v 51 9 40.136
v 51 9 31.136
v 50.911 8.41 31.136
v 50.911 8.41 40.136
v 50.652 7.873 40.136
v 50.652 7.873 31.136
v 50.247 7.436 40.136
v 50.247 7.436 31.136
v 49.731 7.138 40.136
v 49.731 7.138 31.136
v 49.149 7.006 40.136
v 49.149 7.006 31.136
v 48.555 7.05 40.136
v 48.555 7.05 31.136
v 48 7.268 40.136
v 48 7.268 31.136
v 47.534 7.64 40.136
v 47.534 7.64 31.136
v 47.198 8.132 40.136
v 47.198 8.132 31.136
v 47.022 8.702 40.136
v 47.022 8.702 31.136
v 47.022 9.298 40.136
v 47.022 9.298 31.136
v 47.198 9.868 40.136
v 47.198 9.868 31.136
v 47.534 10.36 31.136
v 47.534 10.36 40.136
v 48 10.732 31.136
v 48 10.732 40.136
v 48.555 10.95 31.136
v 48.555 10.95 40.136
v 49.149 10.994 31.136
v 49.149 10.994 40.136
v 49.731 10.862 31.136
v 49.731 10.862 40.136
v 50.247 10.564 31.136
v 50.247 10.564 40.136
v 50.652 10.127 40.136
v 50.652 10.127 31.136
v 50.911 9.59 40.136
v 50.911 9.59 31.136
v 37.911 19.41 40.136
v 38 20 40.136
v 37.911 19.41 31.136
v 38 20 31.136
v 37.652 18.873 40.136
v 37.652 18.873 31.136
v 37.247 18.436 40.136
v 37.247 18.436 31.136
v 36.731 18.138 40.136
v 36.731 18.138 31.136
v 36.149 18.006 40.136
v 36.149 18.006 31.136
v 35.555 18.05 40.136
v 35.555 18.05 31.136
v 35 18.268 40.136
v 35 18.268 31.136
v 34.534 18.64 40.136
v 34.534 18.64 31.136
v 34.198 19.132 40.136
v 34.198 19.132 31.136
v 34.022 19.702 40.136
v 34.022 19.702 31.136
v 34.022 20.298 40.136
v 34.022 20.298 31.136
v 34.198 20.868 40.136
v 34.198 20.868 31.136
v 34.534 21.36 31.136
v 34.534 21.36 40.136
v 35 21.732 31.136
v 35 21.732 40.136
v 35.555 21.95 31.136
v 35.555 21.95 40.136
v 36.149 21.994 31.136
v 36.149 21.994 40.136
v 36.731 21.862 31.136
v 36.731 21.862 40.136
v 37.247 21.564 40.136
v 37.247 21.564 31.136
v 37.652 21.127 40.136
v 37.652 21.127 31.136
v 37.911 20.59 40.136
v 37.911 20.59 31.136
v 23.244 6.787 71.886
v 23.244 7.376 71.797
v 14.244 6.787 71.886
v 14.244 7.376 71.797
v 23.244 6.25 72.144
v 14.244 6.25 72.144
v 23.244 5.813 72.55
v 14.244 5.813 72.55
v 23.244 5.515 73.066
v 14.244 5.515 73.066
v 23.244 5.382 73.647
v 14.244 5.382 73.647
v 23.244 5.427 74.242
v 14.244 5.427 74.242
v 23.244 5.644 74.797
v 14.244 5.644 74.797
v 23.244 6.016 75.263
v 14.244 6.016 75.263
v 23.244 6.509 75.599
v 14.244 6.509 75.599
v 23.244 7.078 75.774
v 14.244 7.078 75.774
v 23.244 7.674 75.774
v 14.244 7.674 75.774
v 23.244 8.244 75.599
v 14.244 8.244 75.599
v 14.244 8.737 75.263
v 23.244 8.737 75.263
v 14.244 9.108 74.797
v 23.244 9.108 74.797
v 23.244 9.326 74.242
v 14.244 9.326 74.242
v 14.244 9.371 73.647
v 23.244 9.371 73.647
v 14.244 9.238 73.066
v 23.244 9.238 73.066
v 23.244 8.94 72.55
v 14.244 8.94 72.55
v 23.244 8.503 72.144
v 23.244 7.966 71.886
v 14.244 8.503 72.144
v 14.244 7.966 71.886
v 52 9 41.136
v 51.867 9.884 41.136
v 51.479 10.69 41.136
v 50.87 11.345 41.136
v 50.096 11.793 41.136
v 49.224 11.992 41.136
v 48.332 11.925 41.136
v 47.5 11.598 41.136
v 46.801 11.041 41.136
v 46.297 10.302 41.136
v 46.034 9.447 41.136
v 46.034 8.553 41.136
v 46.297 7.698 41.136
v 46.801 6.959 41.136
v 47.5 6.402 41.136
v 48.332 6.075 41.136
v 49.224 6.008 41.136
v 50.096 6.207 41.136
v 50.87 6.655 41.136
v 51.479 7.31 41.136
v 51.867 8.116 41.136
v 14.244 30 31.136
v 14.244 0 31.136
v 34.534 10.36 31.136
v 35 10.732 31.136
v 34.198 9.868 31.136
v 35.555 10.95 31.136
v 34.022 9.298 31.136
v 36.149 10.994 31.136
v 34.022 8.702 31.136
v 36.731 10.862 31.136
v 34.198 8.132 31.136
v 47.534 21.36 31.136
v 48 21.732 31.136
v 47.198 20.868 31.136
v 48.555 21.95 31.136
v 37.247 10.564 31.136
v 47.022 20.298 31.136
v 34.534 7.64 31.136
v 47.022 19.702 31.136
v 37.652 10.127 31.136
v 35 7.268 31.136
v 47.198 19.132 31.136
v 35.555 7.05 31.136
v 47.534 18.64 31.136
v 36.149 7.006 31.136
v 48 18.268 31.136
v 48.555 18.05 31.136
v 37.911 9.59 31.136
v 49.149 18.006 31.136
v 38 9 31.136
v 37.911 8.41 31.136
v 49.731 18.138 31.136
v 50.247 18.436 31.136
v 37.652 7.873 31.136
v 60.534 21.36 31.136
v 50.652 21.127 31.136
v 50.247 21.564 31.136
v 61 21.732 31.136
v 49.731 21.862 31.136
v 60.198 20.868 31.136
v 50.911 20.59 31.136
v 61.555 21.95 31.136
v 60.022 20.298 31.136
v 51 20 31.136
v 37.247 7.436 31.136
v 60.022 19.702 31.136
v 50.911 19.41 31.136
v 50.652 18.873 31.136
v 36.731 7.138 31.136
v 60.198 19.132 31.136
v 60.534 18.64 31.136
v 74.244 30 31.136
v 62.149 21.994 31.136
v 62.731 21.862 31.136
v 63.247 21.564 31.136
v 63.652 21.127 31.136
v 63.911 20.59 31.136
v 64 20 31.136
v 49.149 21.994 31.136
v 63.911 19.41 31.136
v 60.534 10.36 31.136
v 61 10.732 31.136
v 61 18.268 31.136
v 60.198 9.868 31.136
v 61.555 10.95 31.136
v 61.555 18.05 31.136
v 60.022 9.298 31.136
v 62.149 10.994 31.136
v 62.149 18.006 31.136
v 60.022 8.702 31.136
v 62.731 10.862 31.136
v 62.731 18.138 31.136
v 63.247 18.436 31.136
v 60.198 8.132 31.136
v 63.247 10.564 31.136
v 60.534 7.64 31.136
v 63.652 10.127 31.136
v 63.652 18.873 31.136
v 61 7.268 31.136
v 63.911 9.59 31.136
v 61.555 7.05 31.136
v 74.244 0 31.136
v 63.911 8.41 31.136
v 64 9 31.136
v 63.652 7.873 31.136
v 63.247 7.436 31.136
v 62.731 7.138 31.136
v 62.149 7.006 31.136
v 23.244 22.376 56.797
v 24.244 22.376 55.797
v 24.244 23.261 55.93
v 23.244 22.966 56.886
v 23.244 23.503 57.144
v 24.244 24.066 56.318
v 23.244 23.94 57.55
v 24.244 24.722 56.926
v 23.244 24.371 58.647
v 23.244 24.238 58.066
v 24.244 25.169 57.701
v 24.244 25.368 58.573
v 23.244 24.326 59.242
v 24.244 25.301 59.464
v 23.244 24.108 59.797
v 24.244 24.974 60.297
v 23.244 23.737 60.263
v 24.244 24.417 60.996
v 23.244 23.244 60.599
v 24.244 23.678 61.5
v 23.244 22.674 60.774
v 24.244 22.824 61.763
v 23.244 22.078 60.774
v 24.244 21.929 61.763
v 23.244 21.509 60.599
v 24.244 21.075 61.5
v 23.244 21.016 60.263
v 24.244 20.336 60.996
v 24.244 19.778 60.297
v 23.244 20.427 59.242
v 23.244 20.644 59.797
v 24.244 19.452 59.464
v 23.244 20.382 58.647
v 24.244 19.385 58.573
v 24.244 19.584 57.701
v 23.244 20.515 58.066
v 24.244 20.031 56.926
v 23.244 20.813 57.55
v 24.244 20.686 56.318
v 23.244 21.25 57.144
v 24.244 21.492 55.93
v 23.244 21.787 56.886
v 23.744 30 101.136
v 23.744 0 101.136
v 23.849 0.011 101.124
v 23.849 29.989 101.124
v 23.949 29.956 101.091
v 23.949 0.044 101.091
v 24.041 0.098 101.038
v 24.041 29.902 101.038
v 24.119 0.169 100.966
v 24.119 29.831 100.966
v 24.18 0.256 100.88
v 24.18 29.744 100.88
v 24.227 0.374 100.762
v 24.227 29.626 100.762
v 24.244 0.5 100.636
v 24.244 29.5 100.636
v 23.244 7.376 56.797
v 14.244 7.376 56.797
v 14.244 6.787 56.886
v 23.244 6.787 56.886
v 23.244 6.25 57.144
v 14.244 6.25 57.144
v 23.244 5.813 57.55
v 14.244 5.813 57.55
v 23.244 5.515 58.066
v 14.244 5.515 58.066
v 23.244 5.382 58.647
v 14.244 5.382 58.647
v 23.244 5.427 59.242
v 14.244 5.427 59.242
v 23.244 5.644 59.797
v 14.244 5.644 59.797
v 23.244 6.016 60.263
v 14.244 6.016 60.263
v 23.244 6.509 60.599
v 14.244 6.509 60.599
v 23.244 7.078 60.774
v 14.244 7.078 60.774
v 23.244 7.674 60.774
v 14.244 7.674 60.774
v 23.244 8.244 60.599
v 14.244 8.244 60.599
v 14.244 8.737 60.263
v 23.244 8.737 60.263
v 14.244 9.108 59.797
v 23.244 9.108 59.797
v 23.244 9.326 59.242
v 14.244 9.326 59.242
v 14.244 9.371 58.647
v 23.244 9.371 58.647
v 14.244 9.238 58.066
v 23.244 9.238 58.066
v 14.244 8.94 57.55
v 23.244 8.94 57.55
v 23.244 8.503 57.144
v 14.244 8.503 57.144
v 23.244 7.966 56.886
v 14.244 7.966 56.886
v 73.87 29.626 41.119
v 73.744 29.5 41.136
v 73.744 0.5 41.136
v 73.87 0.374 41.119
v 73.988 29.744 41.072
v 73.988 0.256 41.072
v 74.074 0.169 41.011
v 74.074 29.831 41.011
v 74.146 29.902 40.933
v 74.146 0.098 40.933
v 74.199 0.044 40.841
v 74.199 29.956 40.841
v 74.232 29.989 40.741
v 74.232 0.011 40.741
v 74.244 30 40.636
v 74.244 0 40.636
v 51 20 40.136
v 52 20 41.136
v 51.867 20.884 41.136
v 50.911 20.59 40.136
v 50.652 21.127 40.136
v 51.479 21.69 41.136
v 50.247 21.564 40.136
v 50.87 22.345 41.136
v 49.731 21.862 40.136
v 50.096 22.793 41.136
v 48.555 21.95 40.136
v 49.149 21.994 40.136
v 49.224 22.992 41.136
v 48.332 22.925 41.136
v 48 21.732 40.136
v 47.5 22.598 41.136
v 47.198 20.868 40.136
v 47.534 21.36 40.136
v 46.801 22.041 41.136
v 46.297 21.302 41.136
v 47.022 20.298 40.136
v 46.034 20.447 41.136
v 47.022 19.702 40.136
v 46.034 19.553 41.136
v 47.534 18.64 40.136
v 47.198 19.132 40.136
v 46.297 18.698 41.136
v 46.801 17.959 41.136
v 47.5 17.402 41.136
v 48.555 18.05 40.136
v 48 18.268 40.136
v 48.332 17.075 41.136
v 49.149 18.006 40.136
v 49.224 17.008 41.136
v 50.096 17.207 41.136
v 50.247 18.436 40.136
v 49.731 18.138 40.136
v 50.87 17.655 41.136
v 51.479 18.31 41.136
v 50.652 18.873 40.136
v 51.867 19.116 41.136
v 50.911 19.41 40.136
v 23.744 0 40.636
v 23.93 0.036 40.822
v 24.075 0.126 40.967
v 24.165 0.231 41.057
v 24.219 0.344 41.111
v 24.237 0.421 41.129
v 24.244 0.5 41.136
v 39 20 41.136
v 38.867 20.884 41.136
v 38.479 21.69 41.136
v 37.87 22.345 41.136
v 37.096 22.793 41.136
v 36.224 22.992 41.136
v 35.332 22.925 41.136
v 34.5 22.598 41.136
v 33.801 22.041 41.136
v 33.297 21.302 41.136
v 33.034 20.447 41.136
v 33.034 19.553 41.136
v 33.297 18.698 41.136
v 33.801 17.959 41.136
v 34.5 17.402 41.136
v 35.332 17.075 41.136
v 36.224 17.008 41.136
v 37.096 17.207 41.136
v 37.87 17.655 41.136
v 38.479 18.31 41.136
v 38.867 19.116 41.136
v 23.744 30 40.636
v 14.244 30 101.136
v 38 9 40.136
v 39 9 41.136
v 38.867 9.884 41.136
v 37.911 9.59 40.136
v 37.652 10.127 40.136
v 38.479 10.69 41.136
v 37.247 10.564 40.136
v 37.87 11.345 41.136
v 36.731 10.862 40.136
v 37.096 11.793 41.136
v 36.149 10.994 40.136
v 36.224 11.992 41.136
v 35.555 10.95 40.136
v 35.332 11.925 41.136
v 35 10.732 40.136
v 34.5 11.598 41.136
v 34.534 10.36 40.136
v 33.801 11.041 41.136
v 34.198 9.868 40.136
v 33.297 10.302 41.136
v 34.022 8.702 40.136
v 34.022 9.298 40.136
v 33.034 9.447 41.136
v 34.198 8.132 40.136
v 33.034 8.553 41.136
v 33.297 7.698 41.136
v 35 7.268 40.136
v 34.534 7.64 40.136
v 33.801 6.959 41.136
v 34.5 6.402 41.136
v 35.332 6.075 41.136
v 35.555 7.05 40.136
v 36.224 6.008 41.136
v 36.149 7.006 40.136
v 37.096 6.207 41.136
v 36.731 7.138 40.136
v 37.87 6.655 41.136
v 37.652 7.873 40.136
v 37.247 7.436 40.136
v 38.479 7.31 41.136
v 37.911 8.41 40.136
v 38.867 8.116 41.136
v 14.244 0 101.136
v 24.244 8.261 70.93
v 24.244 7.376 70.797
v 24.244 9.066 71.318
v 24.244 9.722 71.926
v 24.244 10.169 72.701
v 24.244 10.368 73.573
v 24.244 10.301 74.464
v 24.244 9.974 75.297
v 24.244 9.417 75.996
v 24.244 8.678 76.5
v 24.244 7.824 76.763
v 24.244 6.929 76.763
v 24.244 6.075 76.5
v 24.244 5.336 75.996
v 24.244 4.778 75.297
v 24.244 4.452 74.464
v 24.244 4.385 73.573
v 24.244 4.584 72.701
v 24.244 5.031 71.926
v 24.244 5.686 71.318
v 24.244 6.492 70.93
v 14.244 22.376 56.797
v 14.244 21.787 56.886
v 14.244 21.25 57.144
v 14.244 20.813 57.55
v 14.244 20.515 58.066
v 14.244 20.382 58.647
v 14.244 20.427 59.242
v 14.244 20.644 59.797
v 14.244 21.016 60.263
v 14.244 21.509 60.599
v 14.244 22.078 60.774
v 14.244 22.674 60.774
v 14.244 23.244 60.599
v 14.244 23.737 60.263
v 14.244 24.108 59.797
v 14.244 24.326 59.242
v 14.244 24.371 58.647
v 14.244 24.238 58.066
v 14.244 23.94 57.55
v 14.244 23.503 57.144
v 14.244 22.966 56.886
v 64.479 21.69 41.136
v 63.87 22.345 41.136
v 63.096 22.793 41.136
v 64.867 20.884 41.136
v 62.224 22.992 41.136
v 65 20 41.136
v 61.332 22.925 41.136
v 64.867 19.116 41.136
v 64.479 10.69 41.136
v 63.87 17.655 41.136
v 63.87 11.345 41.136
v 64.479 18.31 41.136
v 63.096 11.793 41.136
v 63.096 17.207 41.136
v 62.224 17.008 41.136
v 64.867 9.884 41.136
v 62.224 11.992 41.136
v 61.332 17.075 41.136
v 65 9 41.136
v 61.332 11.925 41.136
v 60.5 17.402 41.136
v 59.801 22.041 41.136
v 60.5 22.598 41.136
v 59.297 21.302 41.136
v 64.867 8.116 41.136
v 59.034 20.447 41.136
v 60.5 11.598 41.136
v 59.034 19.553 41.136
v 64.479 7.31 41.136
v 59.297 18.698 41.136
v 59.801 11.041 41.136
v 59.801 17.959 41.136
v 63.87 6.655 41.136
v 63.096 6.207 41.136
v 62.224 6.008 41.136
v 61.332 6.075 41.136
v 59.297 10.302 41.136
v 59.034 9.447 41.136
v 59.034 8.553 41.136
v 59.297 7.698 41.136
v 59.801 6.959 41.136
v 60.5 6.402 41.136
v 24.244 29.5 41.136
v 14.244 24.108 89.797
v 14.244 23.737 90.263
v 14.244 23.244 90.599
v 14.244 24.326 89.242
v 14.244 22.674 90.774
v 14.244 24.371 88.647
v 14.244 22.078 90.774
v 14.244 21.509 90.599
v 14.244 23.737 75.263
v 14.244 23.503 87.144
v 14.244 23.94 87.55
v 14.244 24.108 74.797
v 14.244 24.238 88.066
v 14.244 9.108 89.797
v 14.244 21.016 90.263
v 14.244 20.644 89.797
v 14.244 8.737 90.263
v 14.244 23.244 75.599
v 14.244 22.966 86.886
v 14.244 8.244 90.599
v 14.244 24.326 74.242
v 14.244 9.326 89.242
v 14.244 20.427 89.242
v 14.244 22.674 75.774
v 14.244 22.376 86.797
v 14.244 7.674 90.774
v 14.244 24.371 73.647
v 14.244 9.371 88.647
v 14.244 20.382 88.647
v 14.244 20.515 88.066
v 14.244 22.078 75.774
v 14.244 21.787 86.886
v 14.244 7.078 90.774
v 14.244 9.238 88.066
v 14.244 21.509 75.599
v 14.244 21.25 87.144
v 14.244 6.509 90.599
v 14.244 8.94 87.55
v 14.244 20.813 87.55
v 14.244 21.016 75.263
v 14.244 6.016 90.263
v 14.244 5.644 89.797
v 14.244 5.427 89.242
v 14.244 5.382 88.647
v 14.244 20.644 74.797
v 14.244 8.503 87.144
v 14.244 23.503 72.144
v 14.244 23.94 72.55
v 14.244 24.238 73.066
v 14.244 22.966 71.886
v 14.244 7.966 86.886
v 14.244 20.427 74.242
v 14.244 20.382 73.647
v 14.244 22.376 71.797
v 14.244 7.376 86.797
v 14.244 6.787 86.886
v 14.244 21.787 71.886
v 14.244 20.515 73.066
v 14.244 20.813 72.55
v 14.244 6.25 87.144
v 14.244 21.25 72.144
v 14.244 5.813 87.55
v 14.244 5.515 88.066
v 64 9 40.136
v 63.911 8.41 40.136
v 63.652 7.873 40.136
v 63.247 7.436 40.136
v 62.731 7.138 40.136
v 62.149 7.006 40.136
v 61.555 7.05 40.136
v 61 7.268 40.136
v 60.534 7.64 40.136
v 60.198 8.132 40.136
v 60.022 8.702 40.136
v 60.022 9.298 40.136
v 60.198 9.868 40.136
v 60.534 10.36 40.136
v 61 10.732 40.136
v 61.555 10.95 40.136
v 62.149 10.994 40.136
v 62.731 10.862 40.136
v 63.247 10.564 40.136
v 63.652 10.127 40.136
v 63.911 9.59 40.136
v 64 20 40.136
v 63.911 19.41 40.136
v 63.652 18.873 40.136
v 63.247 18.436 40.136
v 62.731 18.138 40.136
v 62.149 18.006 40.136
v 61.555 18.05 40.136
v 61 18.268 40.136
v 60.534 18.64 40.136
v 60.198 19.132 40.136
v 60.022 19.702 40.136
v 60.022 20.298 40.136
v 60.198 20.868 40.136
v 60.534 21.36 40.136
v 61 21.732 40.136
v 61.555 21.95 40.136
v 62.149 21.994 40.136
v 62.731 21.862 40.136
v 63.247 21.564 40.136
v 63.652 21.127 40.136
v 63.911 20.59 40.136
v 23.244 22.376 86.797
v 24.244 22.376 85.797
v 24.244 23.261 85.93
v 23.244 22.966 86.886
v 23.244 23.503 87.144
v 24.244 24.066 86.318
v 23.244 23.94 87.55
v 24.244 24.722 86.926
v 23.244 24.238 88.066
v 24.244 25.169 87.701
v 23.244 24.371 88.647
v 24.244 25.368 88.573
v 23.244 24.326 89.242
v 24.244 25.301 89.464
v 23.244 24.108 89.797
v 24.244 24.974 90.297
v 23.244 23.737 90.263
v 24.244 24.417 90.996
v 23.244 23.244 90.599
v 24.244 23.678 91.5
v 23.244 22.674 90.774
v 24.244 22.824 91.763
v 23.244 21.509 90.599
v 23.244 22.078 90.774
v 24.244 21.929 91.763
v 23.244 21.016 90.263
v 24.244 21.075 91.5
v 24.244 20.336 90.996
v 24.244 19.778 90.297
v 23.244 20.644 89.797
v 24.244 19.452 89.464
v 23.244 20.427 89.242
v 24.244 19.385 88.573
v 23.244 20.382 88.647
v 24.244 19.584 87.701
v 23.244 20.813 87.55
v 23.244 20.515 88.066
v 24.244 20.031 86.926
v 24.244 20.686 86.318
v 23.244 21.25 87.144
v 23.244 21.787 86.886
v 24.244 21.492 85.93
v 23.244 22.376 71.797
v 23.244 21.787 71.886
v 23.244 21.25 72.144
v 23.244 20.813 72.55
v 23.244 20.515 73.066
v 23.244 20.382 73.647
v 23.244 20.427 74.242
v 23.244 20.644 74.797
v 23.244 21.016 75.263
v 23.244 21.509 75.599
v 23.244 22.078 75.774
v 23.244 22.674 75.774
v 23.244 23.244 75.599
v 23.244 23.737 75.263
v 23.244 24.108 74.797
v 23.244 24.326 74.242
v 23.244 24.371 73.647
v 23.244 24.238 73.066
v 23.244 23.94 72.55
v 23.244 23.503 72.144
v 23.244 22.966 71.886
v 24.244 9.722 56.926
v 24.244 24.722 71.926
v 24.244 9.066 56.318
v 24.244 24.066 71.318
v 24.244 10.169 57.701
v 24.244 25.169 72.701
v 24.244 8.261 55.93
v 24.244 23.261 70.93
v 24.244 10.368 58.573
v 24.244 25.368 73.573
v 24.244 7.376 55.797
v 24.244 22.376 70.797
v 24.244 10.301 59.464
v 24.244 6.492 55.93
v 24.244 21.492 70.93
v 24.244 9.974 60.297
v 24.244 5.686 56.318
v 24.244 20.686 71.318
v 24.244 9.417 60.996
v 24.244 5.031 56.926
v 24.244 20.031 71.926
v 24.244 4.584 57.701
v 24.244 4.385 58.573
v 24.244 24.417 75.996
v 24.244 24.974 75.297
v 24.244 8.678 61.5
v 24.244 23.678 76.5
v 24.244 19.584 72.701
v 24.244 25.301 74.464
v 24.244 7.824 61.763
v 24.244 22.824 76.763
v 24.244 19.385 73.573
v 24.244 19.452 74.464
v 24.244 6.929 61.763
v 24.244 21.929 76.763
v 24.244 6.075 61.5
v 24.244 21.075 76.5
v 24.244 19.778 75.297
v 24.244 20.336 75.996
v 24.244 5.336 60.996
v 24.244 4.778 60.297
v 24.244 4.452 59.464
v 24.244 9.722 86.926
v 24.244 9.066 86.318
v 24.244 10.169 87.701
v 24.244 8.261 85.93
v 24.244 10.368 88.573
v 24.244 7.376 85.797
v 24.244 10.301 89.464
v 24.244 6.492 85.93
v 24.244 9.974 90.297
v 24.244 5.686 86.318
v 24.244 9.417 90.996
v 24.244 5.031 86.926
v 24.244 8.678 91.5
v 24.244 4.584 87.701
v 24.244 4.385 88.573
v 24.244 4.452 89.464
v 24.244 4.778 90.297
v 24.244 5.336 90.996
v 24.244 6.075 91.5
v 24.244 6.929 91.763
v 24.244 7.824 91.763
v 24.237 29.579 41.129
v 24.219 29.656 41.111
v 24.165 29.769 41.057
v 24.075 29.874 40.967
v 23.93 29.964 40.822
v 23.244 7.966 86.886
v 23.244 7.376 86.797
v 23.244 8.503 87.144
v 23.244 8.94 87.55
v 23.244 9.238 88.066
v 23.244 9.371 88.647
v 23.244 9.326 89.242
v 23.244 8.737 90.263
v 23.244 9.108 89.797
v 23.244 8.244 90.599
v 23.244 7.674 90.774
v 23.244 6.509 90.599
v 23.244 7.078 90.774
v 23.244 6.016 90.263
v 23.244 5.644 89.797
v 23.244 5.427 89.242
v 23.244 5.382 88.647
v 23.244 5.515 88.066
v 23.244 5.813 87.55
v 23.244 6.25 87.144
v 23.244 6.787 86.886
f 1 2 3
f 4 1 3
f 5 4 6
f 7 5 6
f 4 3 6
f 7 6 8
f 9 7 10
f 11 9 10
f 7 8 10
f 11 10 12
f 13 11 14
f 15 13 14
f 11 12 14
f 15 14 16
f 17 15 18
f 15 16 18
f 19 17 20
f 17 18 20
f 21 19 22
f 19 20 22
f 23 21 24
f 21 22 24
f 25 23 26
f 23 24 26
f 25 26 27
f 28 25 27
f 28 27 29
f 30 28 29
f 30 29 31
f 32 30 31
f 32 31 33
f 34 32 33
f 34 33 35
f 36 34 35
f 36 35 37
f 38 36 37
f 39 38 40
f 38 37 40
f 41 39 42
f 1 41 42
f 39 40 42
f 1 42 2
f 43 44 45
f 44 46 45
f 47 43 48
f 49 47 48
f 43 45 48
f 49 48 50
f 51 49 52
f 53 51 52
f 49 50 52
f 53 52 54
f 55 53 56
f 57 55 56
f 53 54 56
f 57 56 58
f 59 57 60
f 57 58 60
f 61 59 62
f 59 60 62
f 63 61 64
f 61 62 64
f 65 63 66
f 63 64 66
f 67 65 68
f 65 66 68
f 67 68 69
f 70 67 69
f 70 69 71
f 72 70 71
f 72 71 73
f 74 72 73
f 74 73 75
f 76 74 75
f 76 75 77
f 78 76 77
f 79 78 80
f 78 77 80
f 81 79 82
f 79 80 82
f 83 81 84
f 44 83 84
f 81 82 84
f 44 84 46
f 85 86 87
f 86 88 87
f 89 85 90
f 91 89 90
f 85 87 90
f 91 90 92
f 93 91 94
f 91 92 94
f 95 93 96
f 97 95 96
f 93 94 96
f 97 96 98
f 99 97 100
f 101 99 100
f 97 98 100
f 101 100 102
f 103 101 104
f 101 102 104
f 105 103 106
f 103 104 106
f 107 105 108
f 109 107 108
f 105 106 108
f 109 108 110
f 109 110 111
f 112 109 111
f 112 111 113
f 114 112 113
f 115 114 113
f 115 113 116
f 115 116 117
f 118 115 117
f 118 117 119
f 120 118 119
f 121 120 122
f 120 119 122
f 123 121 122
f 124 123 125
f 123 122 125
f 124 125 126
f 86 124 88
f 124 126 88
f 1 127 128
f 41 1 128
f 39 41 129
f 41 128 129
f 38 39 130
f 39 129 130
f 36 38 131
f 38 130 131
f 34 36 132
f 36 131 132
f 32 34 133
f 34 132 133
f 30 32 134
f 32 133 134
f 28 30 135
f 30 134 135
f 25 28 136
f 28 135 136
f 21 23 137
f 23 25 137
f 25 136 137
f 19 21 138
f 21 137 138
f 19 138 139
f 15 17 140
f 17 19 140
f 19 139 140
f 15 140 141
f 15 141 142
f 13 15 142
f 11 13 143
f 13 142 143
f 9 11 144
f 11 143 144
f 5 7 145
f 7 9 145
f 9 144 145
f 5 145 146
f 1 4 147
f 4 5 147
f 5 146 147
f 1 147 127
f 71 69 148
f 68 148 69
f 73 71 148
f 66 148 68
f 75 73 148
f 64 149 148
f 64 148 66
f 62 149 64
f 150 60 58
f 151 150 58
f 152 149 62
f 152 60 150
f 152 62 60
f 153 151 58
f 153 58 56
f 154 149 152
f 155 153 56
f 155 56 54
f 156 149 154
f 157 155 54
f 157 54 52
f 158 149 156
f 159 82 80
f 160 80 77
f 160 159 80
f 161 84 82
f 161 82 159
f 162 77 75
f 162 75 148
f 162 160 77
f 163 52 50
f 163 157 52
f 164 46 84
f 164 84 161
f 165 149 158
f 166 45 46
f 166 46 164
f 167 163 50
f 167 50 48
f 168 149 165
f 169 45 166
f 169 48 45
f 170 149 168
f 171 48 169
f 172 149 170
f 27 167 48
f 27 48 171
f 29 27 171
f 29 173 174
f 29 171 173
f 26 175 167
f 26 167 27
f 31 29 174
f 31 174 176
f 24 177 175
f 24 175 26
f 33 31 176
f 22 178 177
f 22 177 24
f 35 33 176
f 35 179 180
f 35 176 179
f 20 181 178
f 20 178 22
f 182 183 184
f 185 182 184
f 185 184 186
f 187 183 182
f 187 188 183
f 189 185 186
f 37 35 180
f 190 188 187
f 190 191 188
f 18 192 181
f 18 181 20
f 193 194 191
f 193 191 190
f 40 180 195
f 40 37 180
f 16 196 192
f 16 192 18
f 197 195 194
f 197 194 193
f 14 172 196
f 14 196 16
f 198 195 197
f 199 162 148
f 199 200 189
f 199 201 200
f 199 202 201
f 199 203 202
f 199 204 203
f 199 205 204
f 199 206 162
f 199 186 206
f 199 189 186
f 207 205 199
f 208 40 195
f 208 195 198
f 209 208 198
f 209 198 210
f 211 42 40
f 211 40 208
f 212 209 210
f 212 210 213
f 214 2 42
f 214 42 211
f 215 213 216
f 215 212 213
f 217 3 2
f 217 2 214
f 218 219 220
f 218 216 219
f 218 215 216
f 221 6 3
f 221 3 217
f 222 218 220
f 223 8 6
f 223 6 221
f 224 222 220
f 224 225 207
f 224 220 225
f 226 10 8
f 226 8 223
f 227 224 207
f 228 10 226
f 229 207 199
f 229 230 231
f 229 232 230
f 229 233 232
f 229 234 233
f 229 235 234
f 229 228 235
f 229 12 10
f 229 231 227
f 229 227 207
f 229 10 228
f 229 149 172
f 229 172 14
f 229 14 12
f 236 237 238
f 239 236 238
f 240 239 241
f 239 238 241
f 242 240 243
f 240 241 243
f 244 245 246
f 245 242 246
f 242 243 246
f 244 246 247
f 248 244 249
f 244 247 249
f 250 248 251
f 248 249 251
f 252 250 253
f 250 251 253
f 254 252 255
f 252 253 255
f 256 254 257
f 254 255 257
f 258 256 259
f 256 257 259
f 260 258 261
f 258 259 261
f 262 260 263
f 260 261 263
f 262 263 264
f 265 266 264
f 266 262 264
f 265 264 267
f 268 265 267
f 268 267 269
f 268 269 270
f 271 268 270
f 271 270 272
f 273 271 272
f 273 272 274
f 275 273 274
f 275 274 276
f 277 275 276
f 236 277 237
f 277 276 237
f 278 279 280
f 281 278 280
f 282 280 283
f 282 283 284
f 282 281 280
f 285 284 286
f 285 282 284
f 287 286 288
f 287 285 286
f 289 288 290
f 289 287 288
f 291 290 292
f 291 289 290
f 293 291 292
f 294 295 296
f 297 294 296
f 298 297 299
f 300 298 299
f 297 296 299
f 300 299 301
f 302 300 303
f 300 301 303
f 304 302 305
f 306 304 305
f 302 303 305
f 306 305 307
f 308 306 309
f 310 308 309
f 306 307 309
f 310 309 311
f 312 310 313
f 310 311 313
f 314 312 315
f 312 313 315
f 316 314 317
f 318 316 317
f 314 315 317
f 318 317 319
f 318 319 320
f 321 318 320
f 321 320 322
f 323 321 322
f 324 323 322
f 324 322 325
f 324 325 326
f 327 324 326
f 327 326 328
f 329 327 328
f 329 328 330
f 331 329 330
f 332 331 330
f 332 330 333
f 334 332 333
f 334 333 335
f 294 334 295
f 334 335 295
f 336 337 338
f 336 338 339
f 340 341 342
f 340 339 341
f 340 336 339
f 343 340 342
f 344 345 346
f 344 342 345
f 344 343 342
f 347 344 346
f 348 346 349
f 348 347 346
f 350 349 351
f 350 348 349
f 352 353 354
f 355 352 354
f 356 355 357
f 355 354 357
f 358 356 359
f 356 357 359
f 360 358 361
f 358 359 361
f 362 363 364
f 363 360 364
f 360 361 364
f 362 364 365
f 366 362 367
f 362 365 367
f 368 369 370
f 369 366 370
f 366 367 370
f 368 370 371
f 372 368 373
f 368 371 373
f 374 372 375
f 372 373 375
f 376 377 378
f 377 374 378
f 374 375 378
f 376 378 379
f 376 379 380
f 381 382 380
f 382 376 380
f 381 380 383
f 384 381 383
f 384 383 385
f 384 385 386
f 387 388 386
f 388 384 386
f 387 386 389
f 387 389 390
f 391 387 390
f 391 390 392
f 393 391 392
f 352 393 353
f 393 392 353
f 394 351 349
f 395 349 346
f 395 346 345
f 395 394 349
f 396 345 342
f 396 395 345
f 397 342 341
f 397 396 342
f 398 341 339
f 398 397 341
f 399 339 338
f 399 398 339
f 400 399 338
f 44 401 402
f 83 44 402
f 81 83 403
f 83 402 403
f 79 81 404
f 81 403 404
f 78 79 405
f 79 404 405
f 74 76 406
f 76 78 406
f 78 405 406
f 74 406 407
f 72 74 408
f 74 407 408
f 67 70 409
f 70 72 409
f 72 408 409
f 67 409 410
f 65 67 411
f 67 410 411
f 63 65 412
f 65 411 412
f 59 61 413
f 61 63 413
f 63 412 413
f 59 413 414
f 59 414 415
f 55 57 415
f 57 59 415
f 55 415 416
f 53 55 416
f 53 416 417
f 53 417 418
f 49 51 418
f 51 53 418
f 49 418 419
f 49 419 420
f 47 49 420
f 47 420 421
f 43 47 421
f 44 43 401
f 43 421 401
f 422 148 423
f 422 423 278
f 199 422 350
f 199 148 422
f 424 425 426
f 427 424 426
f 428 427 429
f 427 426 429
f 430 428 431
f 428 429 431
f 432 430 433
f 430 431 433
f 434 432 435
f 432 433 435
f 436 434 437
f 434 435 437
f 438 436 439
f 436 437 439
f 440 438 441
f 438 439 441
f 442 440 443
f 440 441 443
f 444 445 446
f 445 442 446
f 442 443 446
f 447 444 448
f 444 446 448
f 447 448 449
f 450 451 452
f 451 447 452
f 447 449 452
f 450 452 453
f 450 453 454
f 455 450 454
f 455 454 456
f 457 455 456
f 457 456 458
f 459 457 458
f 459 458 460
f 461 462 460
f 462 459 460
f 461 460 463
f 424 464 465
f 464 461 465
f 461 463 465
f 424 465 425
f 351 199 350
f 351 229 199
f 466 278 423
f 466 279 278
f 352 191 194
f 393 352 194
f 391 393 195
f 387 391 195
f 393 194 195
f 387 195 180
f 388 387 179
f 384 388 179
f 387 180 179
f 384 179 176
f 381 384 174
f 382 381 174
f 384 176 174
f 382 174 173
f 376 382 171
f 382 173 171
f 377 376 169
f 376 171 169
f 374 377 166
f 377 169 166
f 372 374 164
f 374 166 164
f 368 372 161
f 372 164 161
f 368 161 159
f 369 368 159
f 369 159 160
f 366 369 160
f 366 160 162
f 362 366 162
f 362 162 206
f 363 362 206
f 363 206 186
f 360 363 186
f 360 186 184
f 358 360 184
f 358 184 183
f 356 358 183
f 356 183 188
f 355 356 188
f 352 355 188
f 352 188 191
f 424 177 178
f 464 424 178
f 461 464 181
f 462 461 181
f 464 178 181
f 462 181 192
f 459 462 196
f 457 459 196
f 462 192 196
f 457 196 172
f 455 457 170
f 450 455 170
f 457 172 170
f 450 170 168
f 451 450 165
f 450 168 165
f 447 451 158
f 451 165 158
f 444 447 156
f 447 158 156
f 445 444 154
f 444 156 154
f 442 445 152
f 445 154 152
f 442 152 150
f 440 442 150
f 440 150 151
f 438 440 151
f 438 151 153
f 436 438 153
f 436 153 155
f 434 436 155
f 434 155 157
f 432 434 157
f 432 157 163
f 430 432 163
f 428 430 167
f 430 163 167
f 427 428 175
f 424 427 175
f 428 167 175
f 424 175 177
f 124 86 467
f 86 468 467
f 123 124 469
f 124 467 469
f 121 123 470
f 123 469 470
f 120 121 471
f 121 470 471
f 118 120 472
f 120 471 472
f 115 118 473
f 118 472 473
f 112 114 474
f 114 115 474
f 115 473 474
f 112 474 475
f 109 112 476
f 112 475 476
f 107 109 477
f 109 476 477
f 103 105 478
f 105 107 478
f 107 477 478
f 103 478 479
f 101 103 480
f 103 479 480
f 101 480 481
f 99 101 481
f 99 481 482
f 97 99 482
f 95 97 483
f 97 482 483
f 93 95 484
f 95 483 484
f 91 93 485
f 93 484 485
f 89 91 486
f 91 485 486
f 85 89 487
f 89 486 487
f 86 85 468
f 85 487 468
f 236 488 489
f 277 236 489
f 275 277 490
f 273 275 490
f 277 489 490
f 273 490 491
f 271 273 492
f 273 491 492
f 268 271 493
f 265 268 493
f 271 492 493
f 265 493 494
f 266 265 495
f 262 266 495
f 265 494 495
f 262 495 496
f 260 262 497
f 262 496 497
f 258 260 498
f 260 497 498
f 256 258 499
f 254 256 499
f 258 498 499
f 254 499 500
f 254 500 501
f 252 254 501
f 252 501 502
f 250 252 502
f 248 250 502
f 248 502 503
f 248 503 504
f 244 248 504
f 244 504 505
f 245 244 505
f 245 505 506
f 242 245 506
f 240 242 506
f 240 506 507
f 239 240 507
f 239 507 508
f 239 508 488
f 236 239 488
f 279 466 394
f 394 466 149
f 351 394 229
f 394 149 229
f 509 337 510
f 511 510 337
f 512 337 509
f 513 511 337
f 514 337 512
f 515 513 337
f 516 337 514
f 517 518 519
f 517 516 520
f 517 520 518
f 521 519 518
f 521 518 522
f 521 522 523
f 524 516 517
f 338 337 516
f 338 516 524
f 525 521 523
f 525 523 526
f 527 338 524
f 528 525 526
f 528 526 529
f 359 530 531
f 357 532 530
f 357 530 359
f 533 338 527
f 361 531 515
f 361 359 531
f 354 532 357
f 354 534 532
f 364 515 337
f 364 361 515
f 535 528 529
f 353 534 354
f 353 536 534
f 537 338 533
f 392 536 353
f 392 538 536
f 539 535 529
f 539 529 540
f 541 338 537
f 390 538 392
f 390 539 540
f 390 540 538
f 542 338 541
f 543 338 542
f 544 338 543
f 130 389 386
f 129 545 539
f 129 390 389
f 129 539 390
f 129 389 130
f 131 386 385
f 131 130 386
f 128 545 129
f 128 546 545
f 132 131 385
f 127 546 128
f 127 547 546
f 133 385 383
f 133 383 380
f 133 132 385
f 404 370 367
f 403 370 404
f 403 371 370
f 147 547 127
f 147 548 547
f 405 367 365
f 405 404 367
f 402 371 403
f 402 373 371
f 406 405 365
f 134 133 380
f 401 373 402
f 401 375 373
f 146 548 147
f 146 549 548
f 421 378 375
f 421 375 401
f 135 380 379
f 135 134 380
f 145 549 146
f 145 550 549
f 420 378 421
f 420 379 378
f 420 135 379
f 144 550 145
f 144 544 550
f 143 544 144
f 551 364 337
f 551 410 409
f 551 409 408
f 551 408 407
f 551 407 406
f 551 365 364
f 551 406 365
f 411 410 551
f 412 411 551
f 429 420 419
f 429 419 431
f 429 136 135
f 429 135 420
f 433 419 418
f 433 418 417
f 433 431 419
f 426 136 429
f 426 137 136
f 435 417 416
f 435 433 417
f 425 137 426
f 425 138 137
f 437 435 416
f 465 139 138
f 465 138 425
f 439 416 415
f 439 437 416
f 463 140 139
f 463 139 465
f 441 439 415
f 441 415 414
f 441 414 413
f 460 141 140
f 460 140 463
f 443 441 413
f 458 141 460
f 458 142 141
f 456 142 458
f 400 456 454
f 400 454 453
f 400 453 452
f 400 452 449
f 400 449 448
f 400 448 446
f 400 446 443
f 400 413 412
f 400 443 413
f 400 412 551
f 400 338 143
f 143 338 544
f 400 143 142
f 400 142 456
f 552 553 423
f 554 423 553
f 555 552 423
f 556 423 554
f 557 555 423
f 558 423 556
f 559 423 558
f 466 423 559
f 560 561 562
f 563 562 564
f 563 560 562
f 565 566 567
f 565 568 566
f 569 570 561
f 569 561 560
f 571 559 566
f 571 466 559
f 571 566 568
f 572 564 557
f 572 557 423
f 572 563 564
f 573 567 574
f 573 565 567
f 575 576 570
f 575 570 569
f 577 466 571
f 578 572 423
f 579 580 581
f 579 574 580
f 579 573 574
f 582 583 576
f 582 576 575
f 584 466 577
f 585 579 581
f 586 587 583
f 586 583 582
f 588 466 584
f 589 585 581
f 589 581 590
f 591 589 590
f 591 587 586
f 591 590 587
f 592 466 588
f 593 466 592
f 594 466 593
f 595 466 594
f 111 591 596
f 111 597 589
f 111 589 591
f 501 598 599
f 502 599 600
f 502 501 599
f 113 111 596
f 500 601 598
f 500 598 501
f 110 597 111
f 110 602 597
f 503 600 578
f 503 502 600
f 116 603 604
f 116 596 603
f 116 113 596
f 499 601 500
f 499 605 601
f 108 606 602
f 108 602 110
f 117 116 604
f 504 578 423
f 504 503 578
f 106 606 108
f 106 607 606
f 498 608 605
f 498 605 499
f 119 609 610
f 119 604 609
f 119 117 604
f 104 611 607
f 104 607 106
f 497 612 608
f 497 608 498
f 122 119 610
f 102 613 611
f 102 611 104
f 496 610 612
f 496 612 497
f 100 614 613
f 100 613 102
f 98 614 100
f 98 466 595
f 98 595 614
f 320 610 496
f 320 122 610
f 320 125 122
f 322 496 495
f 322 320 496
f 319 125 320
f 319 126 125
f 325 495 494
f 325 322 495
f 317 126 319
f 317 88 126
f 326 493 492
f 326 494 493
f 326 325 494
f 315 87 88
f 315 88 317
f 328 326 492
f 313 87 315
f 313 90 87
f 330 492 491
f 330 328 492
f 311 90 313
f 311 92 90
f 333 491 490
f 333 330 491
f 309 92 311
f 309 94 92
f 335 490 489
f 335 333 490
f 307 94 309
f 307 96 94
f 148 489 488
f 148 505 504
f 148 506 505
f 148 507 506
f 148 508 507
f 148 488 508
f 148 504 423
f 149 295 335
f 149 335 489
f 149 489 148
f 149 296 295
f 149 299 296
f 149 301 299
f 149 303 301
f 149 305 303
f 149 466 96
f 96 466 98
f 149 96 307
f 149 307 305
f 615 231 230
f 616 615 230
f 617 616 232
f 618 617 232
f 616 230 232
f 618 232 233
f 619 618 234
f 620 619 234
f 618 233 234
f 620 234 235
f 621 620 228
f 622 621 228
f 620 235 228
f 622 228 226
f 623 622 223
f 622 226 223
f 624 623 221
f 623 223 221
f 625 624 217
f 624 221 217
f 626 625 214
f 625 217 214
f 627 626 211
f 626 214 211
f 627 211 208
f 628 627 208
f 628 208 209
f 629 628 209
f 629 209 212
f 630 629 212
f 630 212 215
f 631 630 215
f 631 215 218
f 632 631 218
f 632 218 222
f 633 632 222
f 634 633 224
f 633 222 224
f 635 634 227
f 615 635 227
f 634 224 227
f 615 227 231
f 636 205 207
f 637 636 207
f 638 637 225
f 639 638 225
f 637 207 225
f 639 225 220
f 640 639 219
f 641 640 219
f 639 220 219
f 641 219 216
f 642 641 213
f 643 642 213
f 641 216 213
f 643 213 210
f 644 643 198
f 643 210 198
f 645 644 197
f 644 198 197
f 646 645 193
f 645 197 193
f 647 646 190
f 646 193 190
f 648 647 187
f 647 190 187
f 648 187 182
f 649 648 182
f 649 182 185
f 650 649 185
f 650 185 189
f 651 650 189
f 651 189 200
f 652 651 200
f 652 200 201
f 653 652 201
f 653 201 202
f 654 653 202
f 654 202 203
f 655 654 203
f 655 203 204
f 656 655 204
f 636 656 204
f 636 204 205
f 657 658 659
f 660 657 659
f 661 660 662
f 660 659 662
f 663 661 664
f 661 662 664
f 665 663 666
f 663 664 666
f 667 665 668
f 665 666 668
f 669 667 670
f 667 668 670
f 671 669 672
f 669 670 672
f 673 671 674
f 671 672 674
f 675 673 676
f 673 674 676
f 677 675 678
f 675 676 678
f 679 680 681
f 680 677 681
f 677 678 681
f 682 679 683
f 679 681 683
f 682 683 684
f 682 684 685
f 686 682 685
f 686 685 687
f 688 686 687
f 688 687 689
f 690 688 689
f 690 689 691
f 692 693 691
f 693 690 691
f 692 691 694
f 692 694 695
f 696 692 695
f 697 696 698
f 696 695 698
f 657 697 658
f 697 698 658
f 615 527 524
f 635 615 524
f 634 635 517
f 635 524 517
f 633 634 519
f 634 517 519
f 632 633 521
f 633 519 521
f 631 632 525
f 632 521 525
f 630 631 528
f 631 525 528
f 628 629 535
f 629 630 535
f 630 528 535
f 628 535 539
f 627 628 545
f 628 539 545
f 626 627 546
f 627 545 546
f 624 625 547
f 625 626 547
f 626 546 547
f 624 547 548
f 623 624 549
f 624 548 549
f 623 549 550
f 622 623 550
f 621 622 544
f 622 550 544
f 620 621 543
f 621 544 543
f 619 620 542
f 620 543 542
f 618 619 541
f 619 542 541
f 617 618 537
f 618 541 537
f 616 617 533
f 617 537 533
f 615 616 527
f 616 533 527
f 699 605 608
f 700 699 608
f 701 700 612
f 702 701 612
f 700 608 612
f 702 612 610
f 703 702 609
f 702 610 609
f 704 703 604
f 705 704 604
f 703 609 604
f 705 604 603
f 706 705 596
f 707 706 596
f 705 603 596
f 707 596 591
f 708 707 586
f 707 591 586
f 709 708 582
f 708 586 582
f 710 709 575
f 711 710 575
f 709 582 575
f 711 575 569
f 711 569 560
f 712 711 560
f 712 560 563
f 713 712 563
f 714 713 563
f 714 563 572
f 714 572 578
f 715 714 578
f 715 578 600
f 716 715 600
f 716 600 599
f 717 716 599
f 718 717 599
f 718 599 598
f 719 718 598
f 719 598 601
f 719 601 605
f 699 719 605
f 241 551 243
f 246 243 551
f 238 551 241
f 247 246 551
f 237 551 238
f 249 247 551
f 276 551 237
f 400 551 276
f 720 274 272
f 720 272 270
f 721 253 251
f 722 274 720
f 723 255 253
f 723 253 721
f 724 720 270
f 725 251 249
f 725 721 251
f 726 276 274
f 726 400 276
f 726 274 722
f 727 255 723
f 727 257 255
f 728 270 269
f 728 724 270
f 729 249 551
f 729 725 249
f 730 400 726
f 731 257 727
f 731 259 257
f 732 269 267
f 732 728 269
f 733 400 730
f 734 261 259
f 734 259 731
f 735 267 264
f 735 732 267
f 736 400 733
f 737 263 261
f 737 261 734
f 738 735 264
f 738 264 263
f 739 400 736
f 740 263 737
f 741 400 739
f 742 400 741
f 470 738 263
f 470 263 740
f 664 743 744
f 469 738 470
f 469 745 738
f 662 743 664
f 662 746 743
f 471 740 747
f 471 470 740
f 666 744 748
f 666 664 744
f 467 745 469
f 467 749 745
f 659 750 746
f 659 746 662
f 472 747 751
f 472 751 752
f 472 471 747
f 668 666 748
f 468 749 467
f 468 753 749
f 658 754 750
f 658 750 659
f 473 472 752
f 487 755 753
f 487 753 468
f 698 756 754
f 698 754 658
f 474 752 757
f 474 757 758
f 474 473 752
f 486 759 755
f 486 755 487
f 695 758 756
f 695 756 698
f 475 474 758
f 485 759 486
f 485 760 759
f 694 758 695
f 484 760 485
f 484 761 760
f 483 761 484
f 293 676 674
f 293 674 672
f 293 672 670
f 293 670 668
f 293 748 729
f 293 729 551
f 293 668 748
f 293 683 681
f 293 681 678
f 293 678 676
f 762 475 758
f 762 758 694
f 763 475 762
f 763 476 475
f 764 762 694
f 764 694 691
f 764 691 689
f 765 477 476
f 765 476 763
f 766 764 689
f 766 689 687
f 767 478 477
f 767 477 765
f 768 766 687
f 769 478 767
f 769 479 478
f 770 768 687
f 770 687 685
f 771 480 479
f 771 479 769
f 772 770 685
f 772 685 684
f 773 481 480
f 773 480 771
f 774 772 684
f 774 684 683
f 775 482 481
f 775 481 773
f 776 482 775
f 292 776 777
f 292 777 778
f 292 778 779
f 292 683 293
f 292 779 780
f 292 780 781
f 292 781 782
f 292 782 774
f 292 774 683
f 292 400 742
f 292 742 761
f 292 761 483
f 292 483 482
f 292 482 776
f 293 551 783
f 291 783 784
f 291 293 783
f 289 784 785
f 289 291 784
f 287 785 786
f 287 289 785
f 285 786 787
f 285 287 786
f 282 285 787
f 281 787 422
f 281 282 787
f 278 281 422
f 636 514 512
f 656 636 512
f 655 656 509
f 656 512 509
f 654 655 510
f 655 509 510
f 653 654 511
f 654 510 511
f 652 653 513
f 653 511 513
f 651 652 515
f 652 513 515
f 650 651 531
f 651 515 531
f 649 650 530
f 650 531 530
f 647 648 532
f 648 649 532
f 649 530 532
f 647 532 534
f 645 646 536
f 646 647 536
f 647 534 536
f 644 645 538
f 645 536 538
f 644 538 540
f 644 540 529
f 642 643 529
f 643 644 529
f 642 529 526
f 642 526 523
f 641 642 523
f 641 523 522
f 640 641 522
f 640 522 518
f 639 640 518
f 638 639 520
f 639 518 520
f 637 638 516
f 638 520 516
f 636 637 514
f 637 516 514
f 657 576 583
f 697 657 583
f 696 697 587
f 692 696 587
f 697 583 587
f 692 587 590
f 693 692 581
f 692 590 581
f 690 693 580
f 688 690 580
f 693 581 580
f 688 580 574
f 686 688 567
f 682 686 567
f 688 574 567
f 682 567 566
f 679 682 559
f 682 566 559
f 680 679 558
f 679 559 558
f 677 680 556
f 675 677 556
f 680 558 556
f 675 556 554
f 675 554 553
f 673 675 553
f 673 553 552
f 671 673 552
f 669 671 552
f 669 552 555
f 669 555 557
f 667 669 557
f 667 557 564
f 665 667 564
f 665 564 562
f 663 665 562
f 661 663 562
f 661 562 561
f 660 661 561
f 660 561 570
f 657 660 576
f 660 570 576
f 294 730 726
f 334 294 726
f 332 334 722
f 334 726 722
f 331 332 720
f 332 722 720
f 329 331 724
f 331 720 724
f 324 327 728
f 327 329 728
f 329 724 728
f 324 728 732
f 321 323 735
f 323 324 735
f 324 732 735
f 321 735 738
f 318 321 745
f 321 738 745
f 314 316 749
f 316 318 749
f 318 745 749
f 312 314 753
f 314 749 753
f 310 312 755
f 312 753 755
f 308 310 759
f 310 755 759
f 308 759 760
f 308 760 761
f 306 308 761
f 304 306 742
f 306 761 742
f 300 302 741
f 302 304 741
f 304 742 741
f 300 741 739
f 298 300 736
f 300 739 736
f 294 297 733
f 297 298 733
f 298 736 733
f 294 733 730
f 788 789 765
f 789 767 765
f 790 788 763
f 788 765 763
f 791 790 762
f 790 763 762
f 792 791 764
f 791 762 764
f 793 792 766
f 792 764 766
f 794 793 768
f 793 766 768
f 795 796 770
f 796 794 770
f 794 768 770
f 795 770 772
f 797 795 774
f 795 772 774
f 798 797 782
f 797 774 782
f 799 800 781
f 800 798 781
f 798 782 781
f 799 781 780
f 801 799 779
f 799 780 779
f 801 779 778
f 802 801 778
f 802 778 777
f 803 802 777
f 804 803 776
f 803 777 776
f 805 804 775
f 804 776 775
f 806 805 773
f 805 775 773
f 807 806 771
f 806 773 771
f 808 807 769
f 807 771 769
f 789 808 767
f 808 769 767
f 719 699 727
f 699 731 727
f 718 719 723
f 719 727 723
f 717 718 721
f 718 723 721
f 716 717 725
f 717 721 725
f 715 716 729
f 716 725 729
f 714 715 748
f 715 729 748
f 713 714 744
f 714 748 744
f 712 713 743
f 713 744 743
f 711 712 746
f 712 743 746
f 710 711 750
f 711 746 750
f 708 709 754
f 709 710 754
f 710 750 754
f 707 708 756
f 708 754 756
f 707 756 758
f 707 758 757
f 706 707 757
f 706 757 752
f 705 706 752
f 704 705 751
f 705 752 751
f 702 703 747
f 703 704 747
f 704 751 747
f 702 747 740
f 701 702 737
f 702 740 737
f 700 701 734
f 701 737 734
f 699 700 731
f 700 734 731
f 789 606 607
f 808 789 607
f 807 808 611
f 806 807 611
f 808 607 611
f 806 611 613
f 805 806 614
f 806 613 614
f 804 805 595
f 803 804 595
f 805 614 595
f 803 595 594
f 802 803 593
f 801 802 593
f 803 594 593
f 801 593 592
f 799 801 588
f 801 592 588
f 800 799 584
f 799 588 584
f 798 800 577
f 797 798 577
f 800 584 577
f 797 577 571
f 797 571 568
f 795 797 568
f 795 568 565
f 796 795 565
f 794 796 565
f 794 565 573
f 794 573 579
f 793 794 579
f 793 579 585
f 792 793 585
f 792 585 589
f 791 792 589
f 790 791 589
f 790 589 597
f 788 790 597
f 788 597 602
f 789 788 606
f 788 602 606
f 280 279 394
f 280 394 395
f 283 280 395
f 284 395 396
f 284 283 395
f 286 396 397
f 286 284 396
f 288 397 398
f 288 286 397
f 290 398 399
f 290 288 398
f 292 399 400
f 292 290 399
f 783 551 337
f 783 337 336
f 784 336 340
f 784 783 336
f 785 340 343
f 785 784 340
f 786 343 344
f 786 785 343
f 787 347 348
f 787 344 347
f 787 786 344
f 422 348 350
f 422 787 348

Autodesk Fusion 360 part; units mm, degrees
sketch "Sketch1" plane through (0, 0, 0) normal (0, 1, 0) x (1, 0, 0)
  line L0 (65, -5) -> (65, -14.5431)
  line L1 (14.2436, -31.1356) -> (24.2436, -31.1356)
  line L2 (24.2436, -101.1356) -> (14.2436, -101.1356)
  line L3 (14.2436, -101.1356) -> (14.2436, -31.1356)
  line L4 (24.2436, -31.1356) -> (74.2436, -31.1356)
  line L5 (74.2436, -31.1356) -> (74.2436, -41.1356)
  line L6 (74.2436, -41.1356) -> (24.2436, -41.1356)
  line L7 (24.2436, -41.1356) -> (24.2436, -101.1356)
  dimension "d5" = 10
  dimension "d6" = 70
  dimension "d7" = 50
  dimension "d8" = 10
extrude "Extrude1" add sketch "Sketch1" along normal blind 30
sketch "Sketch2" plane through (0, 0, 0) normal (0, 0, 1) x (1, 0, 0)
  circle A0 centre (36, 20) radius 2
  dimension "d11" = 4
extrude "Extrude2" cut sketch "Sketch2" along normal blind 72
pattern_linear "R-Pattern1" count 3 spacing 13 along (1, 0, 0) count 2 spacing 11 along (0, -1, 0) of "Extrude2"
sketch "Sketch3" plane through (0, 0, 0) normal (1, 0, 0) x (0, 0, -1)
  circle A0 centre (-58.7967, 22.3764) radius 2
  dimension "d18" = 4
extrude "Extrude3" cut sketch "Sketch3" along normal blind 50
pattern_linear "R-Pattern2" count 3 spacing 15 along (0, 0, 1) count 2 spacing 15 along (0, -1, 0) of "Extrude3"
fillet "Fillet1" radius 0.5 6 edges at (49.2436, 30, 41.1356) (74.2436, 15, 41.1356) (24.2436, 30, 71.1356) (24.2436, 15, 101.1356) (24.2436, 0, 71.1356) (49.2436, 0, 41.1356)
chamfer "Chamfer1" distance 1 angle 45 12 edges at (34.1353, 9.7232, 41.1356) (47.1353, 9.7232, 41.1356) (60.1353, 9.7232, 41.1356) (60.1353, 20.7232, 41.1356) (47.1353, 20.7232, 41.1356) (34.1353, 20.7232, 41.1356) (24.2436, 8.0997, 60.6613) (24.2436, 8.0997, 75.6613) (24.2436, 8.0997, 90.6613) (24.2436, 23.0997, 75.6613) (24.2436, 23.0997, 90.6613) (24.2436, 23.0997, 60.6613)
